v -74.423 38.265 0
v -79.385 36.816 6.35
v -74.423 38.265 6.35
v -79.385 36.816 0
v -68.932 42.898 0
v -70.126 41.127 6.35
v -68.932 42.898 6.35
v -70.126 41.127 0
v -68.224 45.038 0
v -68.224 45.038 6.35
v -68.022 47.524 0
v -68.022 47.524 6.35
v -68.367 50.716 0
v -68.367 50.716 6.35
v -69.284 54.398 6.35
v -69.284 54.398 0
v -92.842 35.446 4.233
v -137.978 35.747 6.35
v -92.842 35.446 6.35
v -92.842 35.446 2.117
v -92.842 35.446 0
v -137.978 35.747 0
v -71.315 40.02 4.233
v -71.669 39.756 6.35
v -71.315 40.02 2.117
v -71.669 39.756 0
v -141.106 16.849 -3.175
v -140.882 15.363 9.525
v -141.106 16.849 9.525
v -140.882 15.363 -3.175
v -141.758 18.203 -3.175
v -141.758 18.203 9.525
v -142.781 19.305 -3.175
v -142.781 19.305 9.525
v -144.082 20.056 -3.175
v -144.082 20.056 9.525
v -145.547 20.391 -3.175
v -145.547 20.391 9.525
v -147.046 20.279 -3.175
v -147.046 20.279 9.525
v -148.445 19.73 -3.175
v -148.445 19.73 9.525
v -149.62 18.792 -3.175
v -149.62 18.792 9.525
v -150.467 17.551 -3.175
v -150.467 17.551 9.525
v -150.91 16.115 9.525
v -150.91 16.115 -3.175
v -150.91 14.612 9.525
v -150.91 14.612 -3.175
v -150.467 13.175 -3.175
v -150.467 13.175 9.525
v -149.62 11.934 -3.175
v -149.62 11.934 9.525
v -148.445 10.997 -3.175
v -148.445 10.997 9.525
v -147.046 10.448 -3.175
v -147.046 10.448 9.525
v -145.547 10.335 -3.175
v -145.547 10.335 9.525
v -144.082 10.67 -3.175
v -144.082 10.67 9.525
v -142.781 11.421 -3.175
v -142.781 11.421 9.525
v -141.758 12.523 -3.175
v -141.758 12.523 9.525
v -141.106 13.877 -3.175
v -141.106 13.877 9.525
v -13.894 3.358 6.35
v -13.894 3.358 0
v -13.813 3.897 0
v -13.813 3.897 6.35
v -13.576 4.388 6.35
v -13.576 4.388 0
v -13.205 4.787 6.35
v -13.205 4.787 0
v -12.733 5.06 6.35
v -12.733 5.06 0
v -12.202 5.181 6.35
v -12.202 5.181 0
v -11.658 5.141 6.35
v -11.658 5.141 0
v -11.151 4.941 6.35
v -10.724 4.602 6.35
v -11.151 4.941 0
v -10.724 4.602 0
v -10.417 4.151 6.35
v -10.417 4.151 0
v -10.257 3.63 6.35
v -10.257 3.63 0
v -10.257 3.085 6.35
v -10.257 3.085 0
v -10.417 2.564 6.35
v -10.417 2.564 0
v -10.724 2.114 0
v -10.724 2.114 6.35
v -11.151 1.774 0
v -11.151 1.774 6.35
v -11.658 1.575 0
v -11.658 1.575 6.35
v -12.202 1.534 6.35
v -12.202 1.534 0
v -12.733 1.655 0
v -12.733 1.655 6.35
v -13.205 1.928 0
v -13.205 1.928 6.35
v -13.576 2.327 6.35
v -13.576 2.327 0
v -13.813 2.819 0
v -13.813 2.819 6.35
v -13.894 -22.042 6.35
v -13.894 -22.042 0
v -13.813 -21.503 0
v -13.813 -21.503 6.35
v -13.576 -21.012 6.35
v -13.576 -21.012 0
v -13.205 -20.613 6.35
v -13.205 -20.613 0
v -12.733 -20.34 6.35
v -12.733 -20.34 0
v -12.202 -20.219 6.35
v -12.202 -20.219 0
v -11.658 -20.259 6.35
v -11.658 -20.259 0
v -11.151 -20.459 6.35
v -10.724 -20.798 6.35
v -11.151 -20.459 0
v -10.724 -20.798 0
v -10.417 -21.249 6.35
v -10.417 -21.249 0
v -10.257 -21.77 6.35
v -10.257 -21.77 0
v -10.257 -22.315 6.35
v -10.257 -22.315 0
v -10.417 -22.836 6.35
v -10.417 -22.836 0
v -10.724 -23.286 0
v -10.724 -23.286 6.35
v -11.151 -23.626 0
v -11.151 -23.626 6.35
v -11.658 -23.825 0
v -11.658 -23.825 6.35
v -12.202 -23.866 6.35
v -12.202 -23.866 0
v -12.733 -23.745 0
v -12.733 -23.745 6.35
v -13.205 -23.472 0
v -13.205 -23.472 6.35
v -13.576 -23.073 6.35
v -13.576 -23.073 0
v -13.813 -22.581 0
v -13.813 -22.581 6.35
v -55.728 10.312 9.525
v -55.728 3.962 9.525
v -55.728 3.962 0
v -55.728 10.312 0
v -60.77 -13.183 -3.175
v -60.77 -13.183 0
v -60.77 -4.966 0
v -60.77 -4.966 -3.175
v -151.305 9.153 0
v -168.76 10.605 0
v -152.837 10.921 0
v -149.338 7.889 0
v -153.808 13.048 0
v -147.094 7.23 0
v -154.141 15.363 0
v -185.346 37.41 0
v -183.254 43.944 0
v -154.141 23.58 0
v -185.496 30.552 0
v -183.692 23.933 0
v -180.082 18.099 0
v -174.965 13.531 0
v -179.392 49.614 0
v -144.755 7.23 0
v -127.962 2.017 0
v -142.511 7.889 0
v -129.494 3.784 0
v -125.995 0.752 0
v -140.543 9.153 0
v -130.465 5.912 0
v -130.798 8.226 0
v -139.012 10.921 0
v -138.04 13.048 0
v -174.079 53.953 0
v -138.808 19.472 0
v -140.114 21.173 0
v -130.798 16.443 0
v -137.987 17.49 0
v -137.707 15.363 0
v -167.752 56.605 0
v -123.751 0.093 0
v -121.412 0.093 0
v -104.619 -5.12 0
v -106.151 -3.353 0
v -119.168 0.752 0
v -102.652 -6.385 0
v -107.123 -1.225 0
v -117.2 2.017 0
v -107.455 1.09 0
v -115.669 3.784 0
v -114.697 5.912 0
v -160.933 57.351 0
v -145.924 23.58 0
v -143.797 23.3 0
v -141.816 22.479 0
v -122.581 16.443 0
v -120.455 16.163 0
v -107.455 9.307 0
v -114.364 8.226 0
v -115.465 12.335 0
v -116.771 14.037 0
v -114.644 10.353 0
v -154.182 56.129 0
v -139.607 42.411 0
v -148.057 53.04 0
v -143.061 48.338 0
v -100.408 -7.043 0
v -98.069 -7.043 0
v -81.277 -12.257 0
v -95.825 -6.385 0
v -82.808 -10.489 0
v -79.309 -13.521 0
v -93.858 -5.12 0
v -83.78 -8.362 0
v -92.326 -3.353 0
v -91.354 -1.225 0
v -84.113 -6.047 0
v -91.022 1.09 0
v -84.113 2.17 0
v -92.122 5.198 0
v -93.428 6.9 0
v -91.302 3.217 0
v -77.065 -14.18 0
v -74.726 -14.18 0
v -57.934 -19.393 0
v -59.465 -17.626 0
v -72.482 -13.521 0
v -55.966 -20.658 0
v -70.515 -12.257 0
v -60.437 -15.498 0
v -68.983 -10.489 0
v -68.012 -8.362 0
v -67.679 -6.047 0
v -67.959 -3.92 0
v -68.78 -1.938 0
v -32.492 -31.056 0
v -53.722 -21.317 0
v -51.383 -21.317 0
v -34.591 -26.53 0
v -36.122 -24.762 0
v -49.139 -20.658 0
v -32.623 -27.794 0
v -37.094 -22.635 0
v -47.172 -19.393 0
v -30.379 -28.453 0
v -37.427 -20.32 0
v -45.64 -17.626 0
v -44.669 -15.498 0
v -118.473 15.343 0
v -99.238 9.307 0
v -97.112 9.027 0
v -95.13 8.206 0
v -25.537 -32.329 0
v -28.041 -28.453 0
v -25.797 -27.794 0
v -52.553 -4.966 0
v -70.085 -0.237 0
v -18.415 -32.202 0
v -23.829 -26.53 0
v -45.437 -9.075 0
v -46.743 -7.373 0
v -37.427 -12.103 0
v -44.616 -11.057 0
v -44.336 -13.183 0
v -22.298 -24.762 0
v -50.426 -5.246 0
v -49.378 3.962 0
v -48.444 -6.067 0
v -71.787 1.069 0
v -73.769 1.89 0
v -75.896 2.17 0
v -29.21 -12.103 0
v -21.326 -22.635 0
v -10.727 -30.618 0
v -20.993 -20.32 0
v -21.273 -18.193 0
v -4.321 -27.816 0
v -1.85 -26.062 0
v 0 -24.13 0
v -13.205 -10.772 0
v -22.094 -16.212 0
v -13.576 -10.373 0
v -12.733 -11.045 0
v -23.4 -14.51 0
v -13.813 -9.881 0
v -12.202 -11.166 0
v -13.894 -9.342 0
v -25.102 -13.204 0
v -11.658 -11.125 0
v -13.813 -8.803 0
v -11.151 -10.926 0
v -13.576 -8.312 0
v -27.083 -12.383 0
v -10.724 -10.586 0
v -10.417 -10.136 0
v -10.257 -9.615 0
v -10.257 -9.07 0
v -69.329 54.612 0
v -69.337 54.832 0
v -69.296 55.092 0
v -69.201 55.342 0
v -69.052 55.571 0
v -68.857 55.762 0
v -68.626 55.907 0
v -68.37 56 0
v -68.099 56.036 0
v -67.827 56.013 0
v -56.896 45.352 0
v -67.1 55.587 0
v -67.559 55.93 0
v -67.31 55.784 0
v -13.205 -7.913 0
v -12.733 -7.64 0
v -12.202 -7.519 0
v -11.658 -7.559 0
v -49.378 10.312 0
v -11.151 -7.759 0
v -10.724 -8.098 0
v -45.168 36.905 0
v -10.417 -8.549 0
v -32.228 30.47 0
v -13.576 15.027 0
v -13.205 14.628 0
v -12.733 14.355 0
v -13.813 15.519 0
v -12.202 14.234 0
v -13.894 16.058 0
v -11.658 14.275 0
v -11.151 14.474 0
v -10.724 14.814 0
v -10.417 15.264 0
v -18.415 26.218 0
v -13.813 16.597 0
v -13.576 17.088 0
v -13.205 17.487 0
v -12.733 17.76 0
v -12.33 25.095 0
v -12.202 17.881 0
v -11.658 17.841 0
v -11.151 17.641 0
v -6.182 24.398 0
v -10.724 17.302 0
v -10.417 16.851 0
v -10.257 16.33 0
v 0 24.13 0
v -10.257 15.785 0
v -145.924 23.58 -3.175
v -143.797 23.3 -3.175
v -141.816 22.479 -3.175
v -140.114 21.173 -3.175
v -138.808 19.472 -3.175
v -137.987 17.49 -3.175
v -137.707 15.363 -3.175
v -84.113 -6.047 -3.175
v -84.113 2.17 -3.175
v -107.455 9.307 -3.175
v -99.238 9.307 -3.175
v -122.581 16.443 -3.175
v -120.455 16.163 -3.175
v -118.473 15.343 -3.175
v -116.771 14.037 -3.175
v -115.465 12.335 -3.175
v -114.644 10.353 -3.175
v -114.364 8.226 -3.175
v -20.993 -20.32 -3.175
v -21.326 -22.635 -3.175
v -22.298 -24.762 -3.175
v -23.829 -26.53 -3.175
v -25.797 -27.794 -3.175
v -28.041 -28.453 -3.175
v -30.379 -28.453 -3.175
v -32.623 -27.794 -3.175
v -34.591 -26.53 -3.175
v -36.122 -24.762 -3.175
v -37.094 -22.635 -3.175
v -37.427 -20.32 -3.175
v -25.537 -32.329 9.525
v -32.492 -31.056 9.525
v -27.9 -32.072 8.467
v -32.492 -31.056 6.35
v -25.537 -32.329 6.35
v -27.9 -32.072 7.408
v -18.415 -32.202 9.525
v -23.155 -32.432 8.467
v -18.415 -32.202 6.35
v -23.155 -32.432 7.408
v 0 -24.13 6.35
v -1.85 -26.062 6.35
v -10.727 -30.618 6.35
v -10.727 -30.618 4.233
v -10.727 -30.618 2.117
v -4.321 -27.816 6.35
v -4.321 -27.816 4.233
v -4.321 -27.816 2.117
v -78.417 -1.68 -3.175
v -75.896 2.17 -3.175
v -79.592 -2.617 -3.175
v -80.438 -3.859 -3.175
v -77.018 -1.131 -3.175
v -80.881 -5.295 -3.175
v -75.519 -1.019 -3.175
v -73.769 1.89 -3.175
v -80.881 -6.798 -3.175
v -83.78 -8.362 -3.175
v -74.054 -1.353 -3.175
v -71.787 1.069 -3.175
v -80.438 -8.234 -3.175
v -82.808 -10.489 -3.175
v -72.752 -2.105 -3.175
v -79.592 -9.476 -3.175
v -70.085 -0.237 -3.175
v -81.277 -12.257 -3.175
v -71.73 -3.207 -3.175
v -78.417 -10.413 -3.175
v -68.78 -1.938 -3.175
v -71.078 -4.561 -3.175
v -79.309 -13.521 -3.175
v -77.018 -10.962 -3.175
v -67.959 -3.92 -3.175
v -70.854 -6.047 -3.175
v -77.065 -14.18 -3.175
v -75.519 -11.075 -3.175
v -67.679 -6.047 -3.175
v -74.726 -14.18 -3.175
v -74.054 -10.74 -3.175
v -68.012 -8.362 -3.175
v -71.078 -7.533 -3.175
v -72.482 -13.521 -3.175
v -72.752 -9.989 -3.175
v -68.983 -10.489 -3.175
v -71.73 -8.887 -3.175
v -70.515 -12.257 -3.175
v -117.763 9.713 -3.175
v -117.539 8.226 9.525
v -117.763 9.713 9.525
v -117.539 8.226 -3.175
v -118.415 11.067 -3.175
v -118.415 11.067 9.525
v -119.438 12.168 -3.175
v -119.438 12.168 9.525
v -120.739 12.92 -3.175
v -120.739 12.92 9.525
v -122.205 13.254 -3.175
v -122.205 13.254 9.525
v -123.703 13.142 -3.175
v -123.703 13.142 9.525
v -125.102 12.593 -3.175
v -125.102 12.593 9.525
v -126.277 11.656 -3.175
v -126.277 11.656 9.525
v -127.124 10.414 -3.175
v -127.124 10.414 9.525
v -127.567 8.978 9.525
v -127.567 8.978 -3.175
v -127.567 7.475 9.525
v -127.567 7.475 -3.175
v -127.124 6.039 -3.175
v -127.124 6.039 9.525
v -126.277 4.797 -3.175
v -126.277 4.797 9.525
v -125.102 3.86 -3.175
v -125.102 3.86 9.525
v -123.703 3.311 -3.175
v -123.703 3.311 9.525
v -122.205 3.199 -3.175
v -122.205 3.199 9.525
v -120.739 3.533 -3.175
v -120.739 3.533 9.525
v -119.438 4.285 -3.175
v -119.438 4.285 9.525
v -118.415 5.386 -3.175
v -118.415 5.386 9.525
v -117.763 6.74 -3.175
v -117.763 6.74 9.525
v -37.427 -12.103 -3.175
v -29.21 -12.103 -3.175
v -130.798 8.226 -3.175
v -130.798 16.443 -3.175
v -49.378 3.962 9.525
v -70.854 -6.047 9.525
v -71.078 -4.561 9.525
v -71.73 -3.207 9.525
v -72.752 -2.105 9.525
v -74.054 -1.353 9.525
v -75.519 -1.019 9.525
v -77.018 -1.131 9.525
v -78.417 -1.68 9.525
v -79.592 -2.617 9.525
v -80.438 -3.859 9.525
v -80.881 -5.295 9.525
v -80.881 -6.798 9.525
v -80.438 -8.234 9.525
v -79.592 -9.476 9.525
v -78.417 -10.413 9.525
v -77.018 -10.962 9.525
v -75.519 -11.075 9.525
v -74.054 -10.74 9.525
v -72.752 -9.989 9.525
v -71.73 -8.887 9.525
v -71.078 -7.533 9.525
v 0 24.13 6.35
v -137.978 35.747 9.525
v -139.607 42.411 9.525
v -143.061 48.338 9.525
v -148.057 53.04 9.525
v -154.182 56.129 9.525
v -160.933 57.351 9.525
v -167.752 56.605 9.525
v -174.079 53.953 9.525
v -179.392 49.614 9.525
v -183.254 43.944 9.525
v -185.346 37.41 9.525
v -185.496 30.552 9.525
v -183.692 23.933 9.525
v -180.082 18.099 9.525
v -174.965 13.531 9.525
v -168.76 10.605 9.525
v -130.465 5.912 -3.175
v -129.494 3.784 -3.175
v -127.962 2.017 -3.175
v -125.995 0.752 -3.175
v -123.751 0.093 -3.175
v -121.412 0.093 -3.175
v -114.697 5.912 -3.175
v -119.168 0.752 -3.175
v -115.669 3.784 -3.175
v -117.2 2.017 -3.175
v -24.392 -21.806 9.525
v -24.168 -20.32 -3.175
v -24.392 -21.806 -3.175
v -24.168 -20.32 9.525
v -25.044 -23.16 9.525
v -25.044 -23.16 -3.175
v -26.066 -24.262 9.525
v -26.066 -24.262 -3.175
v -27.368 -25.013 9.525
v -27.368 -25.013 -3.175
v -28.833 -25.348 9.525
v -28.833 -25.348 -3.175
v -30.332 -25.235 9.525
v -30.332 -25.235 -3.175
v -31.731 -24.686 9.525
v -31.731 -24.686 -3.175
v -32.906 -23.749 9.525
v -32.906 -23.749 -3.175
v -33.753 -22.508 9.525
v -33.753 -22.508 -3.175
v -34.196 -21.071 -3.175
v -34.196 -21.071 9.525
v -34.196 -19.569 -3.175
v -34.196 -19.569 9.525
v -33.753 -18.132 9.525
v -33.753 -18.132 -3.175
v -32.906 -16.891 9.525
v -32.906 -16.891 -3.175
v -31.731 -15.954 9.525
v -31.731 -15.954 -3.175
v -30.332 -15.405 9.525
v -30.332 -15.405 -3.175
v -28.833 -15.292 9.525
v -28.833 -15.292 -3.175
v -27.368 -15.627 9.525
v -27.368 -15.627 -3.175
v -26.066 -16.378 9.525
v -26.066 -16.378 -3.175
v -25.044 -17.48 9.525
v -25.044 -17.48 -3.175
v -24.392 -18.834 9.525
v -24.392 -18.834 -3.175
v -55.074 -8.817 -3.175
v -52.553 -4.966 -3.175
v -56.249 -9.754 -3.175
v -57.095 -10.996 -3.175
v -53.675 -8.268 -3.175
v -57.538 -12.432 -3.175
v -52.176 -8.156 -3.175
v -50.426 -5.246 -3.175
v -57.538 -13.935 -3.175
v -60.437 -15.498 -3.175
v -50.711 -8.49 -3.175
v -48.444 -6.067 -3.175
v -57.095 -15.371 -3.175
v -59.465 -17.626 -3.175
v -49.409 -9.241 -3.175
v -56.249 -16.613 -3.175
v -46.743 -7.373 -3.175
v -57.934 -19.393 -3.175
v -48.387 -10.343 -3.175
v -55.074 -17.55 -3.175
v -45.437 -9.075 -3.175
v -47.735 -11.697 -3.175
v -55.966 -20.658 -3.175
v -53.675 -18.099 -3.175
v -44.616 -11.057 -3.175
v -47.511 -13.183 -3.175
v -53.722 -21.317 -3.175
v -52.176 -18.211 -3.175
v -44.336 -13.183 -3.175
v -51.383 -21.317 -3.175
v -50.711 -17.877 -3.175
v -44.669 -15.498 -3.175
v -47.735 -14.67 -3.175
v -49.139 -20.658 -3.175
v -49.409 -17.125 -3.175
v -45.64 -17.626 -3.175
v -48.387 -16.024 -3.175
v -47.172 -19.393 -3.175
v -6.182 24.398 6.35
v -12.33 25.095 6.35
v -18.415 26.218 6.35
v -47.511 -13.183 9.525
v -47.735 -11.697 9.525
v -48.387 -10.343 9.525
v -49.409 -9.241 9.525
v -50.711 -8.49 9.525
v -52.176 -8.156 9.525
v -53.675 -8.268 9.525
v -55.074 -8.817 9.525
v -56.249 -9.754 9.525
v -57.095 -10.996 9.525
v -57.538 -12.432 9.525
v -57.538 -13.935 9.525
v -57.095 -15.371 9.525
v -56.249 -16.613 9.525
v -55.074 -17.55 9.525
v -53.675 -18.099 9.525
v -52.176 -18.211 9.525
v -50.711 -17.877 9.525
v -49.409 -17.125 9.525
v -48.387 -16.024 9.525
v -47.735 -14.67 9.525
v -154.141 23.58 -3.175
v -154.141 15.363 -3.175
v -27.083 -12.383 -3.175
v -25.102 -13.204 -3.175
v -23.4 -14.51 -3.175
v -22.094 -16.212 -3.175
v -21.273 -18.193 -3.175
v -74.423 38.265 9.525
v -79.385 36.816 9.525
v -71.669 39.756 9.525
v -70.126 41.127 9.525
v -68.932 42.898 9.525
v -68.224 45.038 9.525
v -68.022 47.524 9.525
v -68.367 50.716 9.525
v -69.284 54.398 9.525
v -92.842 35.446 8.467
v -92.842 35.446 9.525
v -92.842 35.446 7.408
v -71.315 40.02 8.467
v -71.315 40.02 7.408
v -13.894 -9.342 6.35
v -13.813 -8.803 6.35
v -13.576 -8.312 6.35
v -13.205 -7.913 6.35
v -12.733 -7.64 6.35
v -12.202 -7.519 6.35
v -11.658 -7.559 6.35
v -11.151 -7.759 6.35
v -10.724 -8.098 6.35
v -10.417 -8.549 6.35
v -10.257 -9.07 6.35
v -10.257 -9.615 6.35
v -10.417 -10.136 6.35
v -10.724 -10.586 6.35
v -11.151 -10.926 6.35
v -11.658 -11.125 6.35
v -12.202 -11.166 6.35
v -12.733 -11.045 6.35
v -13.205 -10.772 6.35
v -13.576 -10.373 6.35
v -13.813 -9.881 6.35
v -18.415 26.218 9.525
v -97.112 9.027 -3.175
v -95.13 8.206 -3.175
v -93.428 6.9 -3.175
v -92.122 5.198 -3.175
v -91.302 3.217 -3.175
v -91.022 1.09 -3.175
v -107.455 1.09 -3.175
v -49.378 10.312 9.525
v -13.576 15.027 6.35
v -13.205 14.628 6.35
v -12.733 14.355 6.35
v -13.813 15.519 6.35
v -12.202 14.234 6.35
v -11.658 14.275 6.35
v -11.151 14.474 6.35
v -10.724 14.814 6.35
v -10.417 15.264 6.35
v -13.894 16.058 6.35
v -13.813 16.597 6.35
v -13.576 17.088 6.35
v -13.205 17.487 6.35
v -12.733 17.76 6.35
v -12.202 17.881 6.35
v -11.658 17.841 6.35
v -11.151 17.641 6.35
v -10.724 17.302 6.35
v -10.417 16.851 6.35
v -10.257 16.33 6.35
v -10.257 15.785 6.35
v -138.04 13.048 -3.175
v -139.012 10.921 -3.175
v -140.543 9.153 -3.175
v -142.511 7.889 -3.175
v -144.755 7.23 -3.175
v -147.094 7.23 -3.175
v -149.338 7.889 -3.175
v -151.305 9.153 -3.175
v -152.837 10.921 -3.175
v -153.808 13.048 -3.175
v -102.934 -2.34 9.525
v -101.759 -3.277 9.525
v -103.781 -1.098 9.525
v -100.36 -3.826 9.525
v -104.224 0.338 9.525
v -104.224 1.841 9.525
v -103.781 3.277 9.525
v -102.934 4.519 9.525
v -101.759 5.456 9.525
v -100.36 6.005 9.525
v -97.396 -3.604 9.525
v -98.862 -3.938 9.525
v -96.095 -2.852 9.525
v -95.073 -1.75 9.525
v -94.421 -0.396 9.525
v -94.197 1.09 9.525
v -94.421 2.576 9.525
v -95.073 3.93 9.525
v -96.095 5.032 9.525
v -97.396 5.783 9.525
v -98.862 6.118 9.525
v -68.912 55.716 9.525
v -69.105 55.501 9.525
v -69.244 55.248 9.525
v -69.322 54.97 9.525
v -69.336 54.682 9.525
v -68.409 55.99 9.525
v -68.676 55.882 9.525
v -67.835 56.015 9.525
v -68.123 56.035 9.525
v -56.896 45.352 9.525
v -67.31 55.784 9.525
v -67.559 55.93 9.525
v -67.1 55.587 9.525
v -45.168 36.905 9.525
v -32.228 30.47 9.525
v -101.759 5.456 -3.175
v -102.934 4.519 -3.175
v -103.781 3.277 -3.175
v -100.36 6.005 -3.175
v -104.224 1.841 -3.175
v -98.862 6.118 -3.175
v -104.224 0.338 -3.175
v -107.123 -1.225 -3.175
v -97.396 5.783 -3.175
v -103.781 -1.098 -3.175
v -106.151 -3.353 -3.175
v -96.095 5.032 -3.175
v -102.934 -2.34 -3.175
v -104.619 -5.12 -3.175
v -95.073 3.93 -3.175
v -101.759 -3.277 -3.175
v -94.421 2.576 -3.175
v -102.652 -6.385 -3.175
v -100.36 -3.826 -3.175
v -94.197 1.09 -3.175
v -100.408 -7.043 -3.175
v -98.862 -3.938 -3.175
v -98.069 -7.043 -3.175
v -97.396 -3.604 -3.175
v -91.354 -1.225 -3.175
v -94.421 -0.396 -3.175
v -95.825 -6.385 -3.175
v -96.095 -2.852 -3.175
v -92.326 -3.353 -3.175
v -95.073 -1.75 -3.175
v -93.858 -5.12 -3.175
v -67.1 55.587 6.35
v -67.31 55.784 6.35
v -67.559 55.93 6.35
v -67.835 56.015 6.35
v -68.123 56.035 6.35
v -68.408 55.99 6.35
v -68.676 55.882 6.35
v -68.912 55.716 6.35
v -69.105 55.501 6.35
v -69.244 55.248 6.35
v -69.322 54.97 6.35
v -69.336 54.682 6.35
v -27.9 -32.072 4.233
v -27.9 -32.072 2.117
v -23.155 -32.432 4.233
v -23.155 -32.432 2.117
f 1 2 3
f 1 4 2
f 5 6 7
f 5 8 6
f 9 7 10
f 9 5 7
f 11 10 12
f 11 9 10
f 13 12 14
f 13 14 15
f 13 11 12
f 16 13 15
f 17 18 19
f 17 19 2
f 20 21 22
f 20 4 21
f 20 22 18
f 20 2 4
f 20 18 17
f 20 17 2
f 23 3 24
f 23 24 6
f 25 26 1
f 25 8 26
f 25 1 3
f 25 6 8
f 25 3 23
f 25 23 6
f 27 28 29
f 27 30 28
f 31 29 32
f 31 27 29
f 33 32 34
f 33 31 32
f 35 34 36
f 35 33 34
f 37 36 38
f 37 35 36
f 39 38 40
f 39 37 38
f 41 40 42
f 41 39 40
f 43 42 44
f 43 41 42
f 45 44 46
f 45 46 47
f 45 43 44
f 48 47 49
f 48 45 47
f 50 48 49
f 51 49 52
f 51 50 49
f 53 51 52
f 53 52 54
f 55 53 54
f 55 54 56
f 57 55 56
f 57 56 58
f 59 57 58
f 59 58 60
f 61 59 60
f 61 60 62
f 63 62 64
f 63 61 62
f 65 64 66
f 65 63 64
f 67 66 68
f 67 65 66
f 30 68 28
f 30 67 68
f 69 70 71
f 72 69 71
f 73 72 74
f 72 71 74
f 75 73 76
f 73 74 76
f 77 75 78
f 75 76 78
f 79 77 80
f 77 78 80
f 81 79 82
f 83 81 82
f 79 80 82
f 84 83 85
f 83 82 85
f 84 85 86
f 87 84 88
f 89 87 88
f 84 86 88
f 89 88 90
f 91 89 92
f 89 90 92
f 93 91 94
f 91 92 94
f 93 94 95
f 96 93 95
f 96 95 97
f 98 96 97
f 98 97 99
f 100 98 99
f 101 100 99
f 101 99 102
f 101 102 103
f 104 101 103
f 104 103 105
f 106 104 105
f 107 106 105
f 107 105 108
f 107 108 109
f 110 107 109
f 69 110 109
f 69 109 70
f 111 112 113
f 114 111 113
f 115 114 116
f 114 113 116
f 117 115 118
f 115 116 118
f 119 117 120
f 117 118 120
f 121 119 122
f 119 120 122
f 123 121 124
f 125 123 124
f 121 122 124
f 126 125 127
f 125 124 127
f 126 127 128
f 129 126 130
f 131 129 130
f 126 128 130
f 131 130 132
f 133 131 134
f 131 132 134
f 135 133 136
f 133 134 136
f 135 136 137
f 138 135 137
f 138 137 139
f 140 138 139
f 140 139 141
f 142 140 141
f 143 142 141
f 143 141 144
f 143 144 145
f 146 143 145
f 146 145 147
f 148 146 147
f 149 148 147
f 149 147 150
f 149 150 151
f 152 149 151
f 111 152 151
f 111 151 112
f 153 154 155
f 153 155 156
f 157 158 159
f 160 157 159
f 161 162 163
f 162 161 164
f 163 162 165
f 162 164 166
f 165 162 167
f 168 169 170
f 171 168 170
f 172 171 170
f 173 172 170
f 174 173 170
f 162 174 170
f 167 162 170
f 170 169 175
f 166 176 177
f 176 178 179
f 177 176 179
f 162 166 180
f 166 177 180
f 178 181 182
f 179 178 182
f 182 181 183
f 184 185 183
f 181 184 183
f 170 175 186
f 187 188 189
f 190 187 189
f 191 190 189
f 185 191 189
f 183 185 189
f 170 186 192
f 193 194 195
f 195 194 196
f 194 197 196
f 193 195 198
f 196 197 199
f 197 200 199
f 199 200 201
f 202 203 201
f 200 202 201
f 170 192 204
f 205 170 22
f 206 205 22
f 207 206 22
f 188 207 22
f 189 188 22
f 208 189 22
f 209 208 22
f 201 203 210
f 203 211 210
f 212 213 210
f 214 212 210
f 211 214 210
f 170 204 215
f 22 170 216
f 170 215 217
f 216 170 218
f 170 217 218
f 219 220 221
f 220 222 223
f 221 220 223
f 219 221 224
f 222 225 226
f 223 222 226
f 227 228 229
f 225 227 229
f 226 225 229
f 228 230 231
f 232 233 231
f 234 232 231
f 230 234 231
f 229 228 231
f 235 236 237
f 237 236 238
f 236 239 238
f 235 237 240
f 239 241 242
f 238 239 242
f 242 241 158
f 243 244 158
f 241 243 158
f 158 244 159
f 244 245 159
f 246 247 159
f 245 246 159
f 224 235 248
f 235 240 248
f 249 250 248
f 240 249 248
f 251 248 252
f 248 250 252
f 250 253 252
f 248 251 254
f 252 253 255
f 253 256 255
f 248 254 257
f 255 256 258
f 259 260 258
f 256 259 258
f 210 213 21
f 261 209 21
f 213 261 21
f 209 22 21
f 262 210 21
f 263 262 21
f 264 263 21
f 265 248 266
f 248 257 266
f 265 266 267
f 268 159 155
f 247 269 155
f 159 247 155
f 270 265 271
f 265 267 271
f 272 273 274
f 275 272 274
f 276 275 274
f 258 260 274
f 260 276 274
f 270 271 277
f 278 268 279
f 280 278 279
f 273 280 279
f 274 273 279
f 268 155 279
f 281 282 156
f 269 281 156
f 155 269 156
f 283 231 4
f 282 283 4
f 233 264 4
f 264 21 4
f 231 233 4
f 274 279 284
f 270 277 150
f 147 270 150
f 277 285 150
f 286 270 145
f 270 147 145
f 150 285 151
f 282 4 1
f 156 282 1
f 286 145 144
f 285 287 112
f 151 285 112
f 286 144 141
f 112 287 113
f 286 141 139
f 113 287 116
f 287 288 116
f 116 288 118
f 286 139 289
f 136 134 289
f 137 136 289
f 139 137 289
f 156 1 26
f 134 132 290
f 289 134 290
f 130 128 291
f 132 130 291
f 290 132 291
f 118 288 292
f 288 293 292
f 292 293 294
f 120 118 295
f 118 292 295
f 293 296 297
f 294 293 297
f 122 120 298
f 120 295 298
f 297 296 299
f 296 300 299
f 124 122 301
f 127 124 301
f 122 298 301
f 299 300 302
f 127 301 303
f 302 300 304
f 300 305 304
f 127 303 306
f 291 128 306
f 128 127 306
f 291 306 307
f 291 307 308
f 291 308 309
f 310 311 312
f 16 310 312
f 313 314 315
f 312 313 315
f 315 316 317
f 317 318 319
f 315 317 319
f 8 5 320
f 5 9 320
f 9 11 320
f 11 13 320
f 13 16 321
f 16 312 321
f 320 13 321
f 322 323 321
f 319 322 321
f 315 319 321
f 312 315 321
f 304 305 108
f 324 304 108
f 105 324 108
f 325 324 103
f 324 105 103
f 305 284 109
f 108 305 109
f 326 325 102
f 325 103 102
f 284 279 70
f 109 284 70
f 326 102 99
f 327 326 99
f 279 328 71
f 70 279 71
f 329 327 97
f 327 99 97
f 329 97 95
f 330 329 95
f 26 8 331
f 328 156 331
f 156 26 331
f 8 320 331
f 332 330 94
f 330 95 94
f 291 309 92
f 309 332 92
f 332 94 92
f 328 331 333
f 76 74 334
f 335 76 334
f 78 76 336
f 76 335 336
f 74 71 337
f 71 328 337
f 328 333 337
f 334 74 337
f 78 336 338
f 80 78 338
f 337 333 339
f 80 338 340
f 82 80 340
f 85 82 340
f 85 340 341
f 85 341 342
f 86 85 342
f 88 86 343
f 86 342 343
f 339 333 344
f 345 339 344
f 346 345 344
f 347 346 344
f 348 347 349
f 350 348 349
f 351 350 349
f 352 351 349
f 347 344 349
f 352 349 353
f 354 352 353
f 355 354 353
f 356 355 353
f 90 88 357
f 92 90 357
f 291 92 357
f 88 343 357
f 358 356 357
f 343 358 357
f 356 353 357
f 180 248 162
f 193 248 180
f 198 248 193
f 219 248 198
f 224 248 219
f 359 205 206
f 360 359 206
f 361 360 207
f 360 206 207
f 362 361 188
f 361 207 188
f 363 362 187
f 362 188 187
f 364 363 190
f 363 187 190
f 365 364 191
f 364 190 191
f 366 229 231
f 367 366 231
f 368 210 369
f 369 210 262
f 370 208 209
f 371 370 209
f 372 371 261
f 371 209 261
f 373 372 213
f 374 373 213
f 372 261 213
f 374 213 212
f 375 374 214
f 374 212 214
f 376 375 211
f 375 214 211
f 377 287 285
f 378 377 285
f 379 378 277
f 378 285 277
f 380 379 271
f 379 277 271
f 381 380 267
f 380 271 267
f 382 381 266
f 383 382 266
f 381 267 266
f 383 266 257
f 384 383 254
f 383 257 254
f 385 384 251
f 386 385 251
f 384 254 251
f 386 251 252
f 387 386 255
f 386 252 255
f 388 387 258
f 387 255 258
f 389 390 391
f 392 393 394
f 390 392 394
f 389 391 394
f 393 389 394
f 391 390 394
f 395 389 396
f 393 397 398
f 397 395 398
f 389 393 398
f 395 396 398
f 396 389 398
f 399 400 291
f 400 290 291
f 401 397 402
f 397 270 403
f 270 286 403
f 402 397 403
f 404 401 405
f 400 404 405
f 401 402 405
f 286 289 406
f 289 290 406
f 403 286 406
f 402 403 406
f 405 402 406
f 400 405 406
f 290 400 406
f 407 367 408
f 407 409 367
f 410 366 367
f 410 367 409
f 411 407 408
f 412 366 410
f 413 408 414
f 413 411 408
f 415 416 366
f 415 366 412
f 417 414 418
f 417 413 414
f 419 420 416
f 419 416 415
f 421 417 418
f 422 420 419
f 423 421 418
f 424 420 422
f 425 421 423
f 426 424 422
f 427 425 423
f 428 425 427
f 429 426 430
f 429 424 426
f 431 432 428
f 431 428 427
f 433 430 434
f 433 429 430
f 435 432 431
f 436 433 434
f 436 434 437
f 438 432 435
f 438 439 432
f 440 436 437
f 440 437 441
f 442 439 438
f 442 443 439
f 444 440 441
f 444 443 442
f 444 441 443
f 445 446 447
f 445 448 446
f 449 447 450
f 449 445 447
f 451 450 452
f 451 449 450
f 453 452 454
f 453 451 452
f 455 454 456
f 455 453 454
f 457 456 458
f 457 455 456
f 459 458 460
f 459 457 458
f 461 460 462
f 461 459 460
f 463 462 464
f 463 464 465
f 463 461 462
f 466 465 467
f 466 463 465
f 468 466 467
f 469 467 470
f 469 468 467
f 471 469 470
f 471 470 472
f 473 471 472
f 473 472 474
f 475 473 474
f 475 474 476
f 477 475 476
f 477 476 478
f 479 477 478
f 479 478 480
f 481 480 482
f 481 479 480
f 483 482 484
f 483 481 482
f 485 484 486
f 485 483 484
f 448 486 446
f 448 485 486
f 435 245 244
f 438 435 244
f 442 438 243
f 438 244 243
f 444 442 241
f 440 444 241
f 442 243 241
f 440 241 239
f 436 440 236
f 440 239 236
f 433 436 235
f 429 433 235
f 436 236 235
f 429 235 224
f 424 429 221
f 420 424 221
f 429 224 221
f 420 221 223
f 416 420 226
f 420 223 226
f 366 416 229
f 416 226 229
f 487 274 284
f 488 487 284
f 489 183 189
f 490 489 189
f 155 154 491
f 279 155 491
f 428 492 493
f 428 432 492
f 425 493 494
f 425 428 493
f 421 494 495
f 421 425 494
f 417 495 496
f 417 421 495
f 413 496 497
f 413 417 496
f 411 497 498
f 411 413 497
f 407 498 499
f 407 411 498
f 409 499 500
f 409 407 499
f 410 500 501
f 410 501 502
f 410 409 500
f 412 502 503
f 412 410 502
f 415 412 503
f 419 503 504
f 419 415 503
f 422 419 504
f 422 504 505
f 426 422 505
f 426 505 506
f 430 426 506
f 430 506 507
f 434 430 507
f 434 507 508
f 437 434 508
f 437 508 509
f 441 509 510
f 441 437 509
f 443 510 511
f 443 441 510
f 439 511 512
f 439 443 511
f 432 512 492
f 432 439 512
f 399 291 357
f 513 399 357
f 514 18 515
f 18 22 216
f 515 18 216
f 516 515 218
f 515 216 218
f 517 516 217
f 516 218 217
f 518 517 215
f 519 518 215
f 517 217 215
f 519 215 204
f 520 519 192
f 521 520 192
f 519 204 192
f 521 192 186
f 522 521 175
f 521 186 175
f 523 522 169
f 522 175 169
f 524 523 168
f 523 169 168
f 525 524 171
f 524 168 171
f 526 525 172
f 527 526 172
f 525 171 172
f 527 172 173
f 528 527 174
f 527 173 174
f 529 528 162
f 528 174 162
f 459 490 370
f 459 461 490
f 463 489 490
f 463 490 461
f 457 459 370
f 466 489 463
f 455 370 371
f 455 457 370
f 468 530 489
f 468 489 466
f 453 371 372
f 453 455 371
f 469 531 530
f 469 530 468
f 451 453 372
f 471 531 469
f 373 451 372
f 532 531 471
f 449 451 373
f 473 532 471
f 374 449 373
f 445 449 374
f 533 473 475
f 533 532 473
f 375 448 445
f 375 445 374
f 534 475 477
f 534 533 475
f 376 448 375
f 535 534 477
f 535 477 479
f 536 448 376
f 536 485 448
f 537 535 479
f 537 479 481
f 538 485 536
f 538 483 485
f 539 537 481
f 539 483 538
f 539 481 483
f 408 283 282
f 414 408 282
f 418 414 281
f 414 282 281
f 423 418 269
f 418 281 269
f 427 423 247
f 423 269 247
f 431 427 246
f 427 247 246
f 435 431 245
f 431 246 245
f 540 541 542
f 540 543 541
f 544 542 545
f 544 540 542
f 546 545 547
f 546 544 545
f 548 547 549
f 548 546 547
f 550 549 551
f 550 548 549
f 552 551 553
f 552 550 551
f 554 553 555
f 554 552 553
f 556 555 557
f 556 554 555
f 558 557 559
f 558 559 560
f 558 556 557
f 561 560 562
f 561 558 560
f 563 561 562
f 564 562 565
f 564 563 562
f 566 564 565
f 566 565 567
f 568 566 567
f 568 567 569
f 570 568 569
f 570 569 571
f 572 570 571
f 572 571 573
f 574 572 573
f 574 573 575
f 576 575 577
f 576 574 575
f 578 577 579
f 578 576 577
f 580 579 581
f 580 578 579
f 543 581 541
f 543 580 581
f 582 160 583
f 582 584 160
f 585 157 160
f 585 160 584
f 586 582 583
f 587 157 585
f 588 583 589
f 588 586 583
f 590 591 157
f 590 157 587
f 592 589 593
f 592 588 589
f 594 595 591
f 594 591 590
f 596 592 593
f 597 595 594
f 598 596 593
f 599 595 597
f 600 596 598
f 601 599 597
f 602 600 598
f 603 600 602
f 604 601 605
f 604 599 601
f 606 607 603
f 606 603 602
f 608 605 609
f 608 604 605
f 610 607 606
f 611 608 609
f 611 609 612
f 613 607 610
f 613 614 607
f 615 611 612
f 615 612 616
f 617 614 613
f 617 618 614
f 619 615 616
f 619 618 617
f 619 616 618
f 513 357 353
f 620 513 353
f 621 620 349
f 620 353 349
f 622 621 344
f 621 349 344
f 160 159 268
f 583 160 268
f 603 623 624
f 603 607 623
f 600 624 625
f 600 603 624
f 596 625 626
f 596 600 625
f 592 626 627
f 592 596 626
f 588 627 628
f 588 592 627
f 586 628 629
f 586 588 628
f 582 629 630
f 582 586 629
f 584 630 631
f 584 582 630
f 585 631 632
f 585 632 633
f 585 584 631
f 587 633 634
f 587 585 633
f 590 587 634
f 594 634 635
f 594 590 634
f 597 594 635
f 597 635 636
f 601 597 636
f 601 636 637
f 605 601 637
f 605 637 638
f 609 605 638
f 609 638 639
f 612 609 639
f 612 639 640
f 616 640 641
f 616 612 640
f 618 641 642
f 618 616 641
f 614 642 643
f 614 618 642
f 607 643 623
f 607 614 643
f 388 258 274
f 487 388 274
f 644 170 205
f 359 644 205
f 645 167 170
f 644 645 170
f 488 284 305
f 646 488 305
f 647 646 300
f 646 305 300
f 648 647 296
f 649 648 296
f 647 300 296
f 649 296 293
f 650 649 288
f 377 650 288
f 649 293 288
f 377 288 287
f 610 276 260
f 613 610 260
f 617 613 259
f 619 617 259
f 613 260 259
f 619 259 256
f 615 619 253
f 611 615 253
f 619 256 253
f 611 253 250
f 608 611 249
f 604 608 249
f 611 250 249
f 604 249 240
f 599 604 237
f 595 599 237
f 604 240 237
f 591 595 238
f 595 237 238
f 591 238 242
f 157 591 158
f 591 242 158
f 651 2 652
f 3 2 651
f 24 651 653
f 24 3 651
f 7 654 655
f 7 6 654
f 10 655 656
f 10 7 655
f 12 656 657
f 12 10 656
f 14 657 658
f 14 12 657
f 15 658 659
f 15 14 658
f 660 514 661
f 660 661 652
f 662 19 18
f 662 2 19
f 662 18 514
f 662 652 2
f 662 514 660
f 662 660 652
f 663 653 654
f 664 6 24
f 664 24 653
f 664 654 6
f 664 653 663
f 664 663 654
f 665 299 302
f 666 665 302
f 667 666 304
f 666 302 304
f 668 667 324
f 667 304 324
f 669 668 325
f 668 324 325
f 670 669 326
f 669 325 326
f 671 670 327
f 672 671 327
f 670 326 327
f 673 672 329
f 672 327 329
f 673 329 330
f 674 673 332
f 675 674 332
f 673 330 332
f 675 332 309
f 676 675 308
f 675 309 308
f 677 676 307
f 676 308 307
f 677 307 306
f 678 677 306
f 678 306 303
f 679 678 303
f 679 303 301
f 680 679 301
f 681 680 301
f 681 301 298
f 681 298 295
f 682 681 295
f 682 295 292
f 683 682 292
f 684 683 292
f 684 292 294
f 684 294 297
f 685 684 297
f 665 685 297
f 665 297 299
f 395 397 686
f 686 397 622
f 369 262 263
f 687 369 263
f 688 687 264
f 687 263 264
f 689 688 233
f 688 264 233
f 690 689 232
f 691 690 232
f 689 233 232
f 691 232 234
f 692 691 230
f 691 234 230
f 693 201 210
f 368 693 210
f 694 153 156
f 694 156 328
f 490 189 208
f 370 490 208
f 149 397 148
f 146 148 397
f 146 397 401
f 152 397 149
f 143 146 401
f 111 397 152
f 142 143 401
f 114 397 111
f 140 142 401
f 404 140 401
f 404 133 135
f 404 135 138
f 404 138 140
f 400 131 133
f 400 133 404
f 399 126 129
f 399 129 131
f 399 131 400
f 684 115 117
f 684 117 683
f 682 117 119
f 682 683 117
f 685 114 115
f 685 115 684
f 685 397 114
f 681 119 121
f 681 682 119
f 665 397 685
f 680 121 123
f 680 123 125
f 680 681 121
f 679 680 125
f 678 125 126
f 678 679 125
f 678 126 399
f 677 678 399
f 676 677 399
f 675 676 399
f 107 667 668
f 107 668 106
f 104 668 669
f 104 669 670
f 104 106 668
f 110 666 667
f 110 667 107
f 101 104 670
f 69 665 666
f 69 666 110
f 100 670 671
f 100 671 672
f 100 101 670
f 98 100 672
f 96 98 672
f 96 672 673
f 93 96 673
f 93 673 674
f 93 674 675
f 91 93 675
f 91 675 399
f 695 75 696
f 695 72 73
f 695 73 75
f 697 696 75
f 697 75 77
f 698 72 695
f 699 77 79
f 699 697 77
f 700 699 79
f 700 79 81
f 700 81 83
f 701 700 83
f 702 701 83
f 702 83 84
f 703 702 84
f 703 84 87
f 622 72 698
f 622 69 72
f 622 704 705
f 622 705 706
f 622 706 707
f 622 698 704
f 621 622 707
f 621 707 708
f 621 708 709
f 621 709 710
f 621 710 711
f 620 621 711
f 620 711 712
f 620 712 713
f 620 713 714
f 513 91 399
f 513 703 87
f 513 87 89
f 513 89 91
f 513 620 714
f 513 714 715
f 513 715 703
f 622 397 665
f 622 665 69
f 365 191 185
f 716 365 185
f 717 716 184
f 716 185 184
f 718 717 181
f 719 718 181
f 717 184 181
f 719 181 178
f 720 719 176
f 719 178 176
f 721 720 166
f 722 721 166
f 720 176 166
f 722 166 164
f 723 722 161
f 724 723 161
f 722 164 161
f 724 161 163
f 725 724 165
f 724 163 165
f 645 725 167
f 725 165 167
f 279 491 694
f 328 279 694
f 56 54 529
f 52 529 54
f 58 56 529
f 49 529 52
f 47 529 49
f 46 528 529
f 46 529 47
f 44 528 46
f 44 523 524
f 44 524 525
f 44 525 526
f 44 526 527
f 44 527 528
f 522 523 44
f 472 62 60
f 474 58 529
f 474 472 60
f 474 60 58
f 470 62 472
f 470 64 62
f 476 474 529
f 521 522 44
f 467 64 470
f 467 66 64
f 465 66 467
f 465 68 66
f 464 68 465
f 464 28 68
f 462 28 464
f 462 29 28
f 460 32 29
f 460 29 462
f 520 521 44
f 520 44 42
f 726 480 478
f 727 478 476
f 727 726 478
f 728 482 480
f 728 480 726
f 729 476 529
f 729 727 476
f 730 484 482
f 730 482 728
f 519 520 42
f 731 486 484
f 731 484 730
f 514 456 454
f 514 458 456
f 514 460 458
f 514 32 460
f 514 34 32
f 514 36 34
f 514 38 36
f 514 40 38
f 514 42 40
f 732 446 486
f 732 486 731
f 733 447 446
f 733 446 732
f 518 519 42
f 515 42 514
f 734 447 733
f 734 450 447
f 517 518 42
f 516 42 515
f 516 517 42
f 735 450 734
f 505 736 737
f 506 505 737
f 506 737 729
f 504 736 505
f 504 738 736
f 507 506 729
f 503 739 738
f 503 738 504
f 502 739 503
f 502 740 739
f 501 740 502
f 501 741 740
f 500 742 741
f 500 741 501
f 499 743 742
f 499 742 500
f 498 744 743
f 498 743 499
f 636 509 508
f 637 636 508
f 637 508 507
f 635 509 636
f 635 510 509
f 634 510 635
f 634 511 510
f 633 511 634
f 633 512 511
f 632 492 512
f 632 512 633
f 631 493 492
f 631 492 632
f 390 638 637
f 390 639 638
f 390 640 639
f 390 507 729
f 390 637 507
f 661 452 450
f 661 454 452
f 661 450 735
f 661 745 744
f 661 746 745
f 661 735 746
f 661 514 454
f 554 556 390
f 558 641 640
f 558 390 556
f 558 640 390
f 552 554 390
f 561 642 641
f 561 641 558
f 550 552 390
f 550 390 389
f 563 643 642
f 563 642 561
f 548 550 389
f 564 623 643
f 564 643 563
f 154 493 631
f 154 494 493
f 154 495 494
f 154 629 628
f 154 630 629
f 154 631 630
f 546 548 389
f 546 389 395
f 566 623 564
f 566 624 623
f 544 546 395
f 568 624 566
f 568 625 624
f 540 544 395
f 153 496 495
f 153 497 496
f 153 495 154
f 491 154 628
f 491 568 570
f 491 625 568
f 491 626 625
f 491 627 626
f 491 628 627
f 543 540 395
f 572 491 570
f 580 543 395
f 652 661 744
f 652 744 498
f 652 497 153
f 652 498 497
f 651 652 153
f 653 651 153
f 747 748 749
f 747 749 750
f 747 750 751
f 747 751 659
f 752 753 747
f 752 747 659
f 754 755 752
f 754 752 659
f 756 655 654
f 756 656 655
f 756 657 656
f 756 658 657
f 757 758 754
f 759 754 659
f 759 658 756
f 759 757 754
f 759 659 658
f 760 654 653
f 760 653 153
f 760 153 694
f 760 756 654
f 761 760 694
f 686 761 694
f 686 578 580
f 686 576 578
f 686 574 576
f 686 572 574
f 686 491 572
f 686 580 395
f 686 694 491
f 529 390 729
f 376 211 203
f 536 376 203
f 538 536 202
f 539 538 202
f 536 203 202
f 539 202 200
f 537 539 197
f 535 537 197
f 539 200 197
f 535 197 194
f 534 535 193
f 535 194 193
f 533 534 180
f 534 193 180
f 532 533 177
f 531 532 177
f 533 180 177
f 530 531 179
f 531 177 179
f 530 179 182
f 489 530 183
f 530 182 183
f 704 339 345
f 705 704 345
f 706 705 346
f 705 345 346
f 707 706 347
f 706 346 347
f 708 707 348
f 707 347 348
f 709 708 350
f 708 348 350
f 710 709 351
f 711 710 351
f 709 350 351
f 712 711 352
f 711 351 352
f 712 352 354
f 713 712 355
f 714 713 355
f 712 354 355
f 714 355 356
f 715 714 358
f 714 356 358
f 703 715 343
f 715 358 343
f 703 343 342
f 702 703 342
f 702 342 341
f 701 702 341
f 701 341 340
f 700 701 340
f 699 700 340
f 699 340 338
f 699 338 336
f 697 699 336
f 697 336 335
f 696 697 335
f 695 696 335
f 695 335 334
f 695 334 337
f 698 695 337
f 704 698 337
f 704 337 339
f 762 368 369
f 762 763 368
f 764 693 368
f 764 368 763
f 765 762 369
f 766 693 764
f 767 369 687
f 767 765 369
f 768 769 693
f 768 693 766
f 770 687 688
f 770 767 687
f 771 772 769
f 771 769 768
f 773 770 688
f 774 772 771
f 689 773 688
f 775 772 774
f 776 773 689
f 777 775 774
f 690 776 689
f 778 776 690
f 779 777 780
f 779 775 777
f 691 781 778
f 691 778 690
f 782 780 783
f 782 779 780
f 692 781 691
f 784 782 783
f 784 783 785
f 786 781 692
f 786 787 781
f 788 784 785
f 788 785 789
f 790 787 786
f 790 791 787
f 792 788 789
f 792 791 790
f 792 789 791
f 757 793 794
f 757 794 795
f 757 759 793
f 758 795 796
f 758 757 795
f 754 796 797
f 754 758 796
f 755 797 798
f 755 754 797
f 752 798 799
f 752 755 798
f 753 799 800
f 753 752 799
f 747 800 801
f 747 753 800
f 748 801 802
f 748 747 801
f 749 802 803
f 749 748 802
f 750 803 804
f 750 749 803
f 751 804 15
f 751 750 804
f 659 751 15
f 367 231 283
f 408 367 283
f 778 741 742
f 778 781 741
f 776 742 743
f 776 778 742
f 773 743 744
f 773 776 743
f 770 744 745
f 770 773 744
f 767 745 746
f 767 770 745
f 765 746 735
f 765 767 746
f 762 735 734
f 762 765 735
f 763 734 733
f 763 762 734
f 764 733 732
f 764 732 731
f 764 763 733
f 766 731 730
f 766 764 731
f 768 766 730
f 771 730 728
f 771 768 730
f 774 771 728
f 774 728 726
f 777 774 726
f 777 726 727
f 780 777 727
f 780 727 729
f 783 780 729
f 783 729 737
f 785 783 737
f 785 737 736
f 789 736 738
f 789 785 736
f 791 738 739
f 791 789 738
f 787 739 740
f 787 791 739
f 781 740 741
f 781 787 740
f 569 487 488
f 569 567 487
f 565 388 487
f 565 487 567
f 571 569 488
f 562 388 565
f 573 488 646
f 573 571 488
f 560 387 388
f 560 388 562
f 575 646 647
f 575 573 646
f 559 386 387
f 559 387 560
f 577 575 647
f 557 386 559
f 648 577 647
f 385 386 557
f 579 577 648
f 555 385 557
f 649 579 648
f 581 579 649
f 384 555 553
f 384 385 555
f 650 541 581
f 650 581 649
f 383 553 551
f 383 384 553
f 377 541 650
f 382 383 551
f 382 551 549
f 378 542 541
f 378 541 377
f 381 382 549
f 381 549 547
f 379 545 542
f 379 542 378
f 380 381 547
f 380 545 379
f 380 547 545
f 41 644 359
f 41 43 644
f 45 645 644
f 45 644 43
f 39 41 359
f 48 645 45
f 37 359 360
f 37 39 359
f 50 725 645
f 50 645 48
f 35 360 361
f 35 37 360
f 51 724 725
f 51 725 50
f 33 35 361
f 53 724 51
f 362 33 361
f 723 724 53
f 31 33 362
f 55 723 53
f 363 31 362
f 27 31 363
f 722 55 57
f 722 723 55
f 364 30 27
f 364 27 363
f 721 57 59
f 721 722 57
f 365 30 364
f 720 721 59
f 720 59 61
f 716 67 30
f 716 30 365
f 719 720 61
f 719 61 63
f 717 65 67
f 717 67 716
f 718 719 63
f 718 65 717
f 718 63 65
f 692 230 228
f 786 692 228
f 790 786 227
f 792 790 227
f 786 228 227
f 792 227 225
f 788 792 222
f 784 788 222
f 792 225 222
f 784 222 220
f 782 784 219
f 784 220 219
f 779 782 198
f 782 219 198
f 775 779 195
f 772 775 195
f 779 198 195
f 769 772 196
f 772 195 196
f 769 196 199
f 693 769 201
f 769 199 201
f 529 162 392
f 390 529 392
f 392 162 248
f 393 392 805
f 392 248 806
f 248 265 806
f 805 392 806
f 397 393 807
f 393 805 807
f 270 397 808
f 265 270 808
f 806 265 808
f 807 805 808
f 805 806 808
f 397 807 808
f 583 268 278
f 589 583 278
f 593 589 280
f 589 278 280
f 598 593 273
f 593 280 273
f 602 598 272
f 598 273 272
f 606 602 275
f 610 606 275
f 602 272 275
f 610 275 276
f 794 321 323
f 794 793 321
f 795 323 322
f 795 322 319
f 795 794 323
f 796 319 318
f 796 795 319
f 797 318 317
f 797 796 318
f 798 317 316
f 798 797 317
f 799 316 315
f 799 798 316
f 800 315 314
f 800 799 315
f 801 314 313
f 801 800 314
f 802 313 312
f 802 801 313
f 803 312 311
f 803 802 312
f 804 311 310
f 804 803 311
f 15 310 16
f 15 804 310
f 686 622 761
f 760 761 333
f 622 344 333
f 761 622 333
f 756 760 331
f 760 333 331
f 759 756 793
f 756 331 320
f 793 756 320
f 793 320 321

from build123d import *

# Parameters (mm, degrees)
F0_R      = 5.0419
F1_DEPTH  = 6.35
F2_DEPTH  = 9.525
F4_D      = 3.6576
F5_R      = 1.27
F8_W      = 6.35
F8_H      = 6.35
F9_DEPTH  = 9.5260001
F10_R     = 5.0419
F11_DEPTH = 3.175


with BuildPart() as f1:
    # F0 (on Top) → F1 (new body)
    with BuildSketch(Plane.XY):
        with BuildLine():
            Line((0, 0), (0, 24.13))
            ThreePointArc((0, 24.13), (-9.2620503813, 24.6926494565), (-18.415, 26.2176625565))
            Line((-18.415, 26.2176625565), (-18.415, -32.2023374435))
            add(Edge.make_bspline(
                [(-18.415, -32.2023374435), (-10.35310168, -31.3379440787), (-3.0120759205, -28.1461012273), (0, -24.13)],
                knots=[12.2106695442, 12.2106695442, 12.2106695442, 12.2106695442, 33.2224141479, 33.2224141479, 33.2224141479, 33.2224141479], degree=3))
            Line((0, -24.13), (0, 0))
        make_face()
        with BuildLine():
            Line((-18.415, -32.2023374435), (-18.415, 26.2176625565))
            ThreePointArc((-18.415, 26.2176625565), (-48.7549341061, 39.1874227389), (-72.2748938826, 62.3291118058))
            add(Edge.make_bspline(
                [(-137.9783539955, 35.7469866649), (-73.1067731977, 34.5293954015), (-59.7019699566, 33.2077455579), (-72.2748938826, 62.3291118058)],
                knots=[0, 0, 0, 0, 70.8770346997, 70.8770346997, 70.8770346997, 70.8770346997], degree=3))
            ThreePointArc((-137.9783539955, 35.7469866649), (-162.9147928474, 57.3381501066), (-185.674, 33.4629996115))
            ThreePointArc((-185.674, 33.4629996115), (-180.9856867862, 19.2452424177), (-168.7599080893, 10.6049162859))
            Line((-168.7599080893, 10.6049162859), (-32.4923986546, -31.0562422342))
            add(Edge.make_bspline(
                [(-32.4923986546, -31.0562422342), (-28.0285616621, -32.4209741599), (-23.1000548653, -32.7046670659), (-18.415, -32.2023374435)],
                knots=[0, 0, 0, 0, 12.2106695442, 12.2106695442, 12.2106695442, 12.2106695442], degree=3))
        make_face()
        with Locations((-99.2384759306, 1.0898536678)):
            Circle(F0_R, mode=Mode.SUBTRACT)
        with Locations((-122.5813012408, 8.226471557)):
            Circle(F0_R, mode=Mode.SUBTRACT)
        with Locations((-52.5528253102, -13.1833821107)):
            Circle(F0_R, mode=Mode.SUBTRACT)
        with Locations((-29.21, -20.32)):
            Circle(F0_R, mode=Mode.SUBTRACT)
        with Locations((-75.8956506204, -6.0467642215)):
            Circle(F0_R, mode=Mode.SUBTRACT)
        with Locations((-145.924126551, 15.3630894463)):
            Circle(F0_R, mode=Mode.SUBTRACT)
    extrude(amount=F1_DEPTH)

    # F0 (on Top) → F2 (join)
    with BuildSketch(Plane.XY):
        with BuildLine():
            Line((-18.415, -32.2023374435), (-18.415, 26.2176625565))
            ThreePointArc((-18.415, 26.2176625565), (-48.7549341061, 39.1874227389), (-72.2748938826, 62.3291118058))
            add(Edge.make_bspline(
                [(-137.9783539955, 35.7469866649), (-73.1067731977, 34.5293954015), (-59.7019699566, 33.2077455579), (-72.2748938826, 62.3291118058)],
                knots=[0, 0, 0, 0, 70.8770346997, 70.8770346997, 70.8770346997, 70.8770346997], degree=3))
            ThreePointArc((-137.9783539955, 35.7469866649), (-162.9147928474, 57.3381501066), (-185.674, 33.4629996115))
            ThreePointArc((-185.674, 33.4629996115), (-180.9856867862, 19.2452424177), (-168.7599080893, 10.6049162859))
            Line((-168.7599080893, 10.6049162859), (-32.4923986546, -31.0562422342))
            add(Edge.make_bspline(
                [(-32.4923986546, -31.0562422342), (-28.0285616621, -32.4209741599), (-23.1000548653, -32.7046670659), (-18.415, -32.2023374435)],
                knots=[0, 0, 0, 0, 12.2106695442, 12.2106695442, 12.2106695442, 12.2106695442], degree=3))
        make_face()
        with Locations((-99.2384759306, 1.0898536678)):
            Circle(F0_R, mode=Mode.SUBTRACT)
        with Locations((-122.5813012408, 8.226471557)):
            Circle(F0_R, mode=Mode.SUBTRACT)
        with Locations((-52.5528253102, -13.1833821107)):
            Circle(F0_R, mode=Mode.SUBTRACT)
        with Locations((-29.21, -20.32)):
            Circle(F0_R, mode=Mode.SUBTRACT)
        with Locations((-75.8956506204, -6.0467642215)):
            Circle(F0_R, mode=Mode.SUBTRACT)
        with Locations((-145.924126551, 15.3630894463)):
            Circle(F0_R, mode=Mode.SUBTRACT)
    extrude(amount=F2_DEPTH)

    # F4 (through all)
    with Locations(Plane.XY.offset(6.35)):
        with Locations((-12.065, 16.0576625565), (-12.065, 3.3576625565), (-12.065, -9.3423374435), (-12.065, -22.0423374435)):
            Hole(F4_D / 2)

    # F5
    f5_edges = [f1.edges().sort_by_distance(p)[0] for p in [
        (-72.274894, 62.329112, 3.175),
        (-72.274894, 62.329112, 7.9375),
    ]]
    fillet(f5_edges, radius=F5_R)

    # F8 (on Top) → F9 (cut, through all)
    with BuildSketch(Plane.XY):
        with Locations((-52.5528253102, 7.1366178893)):
            Rectangle(F8_W, F8_H)
    extrude(amount=F9_DEPTH, mode=Mode.SUBTRACT)

    # F10 (on face) → F11 (join)
    with BuildSketch(Plane(origin=(0, 0, 0), x_dir=(1, 0, 0), z_dir=(0, 0, -1))):
        with BuildLine():
            ThreePointArc((-29.21, 12.1031), (-23.3997742897, 14.5097742897), (-20.9931, 20.32))
            ThreePointArc((-20.9931, 20.32), (-29.21, 28.5369), (-37.4269, 20.32))
            ThreePointArc((-37.4269, 20.32), (-35.0202257103, 14.5097742897), (-29.21, 12.1031))
        make_face()
        with Locations((-29.21, 20.32)):
            Circle(F10_R, mode=Mode.SUBTRACT)
        with BuildLine():
            ThreePointArc((-29.21, 12.1031), (-35.0202257103, 14.5097742897), (-37.4269, 20.32))
            Line((-37.4269, 20.32), (-37.4269, 12.1031))
            Line((-37.4269, 12.1031), (-29.21, 12.1031))
        make_face()
        with BuildLine():
            ThreePointArc((-52.5528253102, 4.9664821107), (-58.3630510205, 7.3731564004), (-60.7697253102, 13.1833821107))
            Line((-60.7697253102, 13.1833821107), (-60.7697253102, 4.9664821107))
            Line((-60.7697253102, 4.9664821107), (-52.5528253102, 4.9664821107))
        make_face()
        with BuildLine():
            ThreePointArc((-44.3359253102, 13.1833821107), (-52.5528253102, 21.4002821107), (-60.7697253102, 13.1833821107))
            ThreePointArc((-60.7697253102, 13.1833821107), (-58.3630510205, 7.3731564004), (-52.5528253102, 4.9664821107))
            ThreePointArc((-52.5528253102, 4.9664821107), (-46.7425995999, 7.3731564004), (-44.3359253102, 13.1833821107))
        make_face()
        with Locations((-52.5528253102, 13.1833821107)):
            Circle(F10_R, mode=Mode.SUBTRACT)
        with BuildLine():
            ThreePointArc((-75.8956506204, -2.1701357785), (-81.7058763307, 0.2365385111), (-84.1125506204, 6.0467642215))
            Line((-84.1125506204, 6.0467642215), (-84.1125506204, -2.1701357785))
            Line((-84.1125506204, -2.1701357785), (-75.8956506204, -2.1701357785))
        make_face()
        with BuildLine():
            ThreePointArc((-67.6787506204, 6.0467642215), (-75.8956506204, 14.2636642215), (-84.1125506204, 6.0467642215))
            ThreePointArc((-84.1125506204, 6.0467642215), (-81.7058763307, 0.2365385111), (-75.8956506204, -2.1701357785))
            ThreePointArc((-75.8956506204, -2.1701357785), (-70.0854249101, 0.2365385111), (-67.6787506204, 6.0467642215))
        make_face()
        with Locations((-75.8956506204, 6.0467642215)):
            Circle(F10_R, mode=Mode.SUBTRACT)
        with BuildLine():
            ThreePointArc((-99.2384759306, -9.3067536678), (-105.0487016409, -6.9000793781), (-107.4553759306, -1.0898536678))
            Line((-107.4553759306, -1.0898536678), (-107.4553759306, -9.3067536678))
            Line((-107.4553759306, -9.3067536678), (-99.2384759306, -9.3067536678))
        make_face()
        with BuildLine():
            ThreePointArc((-91.0215759306, -1.0898536678), (-99.2384759306, 7.1270463322), (-107.4553759306, -1.0898536678))
            ThreePointArc((-107.4553759306, -1.0898536678), (-105.0487016409, -6.9000793781), (-99.2384759306, -9.3067536678))
            ThreePointArc((-99.2384759306, -9.3067536678), (-93.4282502203, -6.9000793781), (-91.0215759306, -1.0898536678))
        make_face()
        with Locations((-99.2384759306, -1.0898536678)):
            Circle(F10_R, mode=Mode.SUBTRACT)
        with BuildLine():
            ThreePointArc((-122.5813012408, -16.443371557), (-128.3915269511, -14.0366972674), (-130.7982012408, -8.226471557))
            Line((-130.7982012408, -8.226471557), (-130.7982012408, -16.443371557))
            Line((-130.7982012408, -16.443371557), (-122.5813012408, -16.443371557))
        make_face()
        with BuildLine():
            ThreePointArc((-114.3644012408, -8.226471557), (-122.5813012408, -0.009571557), (-130.7982012408, -8.226471557))
            ThreePointArc((-130.7982012408, -8.226471557), (-128.3915269511, -14.0366972674), (-122.5813012408, -16.443371557))
            ThreePointArc((-122.5813012408, -16.443371557), (-116.7710755305, -14.0366972674), (-114.3644012408, -8.226471557))
        make_face()
        with Locations((-122.5813012408, -8.226471557)):
            Circle(F10_R, mode=Mode.SUBTRACT)
        with BuildLine():
            ThreePointArc((-145.924126551, -23.5799894463), (-151.7343522614, -21.1733151566), (-154.141026551, -15.3630894463))
            Line((-154.141026551, -15.3630894463), (-154.141026551, -23.5799894463))
            Line((-154.141026551, -23.5799894463), (-145.924126551, -23.5799894463))
        make_face()
        with BuildLine():
            ThreePointArc((-137.707226551, -15.3630894463), (-145.924126551, -7.1461894463), (-154.141026551, -15.3630894463))
            ThreePointArc((-154.141026551, -15.3630894463), (-151.7343522614, -21.1733151566), (-145.924126551, -23.5799894463))
            ThreePointArc((-145.924126551, -23.5799894463), (-140.1139008407, -21.1733151566), (-137.707226551, -15.3630894463))
        make_face()
        with Locations((-145.924126551, -15.3630894463)):
            Circle(F10_R, mode=Mode.SUBTRACT)
    extrude(amount=F11_DEPTH)


solid = f1.part
